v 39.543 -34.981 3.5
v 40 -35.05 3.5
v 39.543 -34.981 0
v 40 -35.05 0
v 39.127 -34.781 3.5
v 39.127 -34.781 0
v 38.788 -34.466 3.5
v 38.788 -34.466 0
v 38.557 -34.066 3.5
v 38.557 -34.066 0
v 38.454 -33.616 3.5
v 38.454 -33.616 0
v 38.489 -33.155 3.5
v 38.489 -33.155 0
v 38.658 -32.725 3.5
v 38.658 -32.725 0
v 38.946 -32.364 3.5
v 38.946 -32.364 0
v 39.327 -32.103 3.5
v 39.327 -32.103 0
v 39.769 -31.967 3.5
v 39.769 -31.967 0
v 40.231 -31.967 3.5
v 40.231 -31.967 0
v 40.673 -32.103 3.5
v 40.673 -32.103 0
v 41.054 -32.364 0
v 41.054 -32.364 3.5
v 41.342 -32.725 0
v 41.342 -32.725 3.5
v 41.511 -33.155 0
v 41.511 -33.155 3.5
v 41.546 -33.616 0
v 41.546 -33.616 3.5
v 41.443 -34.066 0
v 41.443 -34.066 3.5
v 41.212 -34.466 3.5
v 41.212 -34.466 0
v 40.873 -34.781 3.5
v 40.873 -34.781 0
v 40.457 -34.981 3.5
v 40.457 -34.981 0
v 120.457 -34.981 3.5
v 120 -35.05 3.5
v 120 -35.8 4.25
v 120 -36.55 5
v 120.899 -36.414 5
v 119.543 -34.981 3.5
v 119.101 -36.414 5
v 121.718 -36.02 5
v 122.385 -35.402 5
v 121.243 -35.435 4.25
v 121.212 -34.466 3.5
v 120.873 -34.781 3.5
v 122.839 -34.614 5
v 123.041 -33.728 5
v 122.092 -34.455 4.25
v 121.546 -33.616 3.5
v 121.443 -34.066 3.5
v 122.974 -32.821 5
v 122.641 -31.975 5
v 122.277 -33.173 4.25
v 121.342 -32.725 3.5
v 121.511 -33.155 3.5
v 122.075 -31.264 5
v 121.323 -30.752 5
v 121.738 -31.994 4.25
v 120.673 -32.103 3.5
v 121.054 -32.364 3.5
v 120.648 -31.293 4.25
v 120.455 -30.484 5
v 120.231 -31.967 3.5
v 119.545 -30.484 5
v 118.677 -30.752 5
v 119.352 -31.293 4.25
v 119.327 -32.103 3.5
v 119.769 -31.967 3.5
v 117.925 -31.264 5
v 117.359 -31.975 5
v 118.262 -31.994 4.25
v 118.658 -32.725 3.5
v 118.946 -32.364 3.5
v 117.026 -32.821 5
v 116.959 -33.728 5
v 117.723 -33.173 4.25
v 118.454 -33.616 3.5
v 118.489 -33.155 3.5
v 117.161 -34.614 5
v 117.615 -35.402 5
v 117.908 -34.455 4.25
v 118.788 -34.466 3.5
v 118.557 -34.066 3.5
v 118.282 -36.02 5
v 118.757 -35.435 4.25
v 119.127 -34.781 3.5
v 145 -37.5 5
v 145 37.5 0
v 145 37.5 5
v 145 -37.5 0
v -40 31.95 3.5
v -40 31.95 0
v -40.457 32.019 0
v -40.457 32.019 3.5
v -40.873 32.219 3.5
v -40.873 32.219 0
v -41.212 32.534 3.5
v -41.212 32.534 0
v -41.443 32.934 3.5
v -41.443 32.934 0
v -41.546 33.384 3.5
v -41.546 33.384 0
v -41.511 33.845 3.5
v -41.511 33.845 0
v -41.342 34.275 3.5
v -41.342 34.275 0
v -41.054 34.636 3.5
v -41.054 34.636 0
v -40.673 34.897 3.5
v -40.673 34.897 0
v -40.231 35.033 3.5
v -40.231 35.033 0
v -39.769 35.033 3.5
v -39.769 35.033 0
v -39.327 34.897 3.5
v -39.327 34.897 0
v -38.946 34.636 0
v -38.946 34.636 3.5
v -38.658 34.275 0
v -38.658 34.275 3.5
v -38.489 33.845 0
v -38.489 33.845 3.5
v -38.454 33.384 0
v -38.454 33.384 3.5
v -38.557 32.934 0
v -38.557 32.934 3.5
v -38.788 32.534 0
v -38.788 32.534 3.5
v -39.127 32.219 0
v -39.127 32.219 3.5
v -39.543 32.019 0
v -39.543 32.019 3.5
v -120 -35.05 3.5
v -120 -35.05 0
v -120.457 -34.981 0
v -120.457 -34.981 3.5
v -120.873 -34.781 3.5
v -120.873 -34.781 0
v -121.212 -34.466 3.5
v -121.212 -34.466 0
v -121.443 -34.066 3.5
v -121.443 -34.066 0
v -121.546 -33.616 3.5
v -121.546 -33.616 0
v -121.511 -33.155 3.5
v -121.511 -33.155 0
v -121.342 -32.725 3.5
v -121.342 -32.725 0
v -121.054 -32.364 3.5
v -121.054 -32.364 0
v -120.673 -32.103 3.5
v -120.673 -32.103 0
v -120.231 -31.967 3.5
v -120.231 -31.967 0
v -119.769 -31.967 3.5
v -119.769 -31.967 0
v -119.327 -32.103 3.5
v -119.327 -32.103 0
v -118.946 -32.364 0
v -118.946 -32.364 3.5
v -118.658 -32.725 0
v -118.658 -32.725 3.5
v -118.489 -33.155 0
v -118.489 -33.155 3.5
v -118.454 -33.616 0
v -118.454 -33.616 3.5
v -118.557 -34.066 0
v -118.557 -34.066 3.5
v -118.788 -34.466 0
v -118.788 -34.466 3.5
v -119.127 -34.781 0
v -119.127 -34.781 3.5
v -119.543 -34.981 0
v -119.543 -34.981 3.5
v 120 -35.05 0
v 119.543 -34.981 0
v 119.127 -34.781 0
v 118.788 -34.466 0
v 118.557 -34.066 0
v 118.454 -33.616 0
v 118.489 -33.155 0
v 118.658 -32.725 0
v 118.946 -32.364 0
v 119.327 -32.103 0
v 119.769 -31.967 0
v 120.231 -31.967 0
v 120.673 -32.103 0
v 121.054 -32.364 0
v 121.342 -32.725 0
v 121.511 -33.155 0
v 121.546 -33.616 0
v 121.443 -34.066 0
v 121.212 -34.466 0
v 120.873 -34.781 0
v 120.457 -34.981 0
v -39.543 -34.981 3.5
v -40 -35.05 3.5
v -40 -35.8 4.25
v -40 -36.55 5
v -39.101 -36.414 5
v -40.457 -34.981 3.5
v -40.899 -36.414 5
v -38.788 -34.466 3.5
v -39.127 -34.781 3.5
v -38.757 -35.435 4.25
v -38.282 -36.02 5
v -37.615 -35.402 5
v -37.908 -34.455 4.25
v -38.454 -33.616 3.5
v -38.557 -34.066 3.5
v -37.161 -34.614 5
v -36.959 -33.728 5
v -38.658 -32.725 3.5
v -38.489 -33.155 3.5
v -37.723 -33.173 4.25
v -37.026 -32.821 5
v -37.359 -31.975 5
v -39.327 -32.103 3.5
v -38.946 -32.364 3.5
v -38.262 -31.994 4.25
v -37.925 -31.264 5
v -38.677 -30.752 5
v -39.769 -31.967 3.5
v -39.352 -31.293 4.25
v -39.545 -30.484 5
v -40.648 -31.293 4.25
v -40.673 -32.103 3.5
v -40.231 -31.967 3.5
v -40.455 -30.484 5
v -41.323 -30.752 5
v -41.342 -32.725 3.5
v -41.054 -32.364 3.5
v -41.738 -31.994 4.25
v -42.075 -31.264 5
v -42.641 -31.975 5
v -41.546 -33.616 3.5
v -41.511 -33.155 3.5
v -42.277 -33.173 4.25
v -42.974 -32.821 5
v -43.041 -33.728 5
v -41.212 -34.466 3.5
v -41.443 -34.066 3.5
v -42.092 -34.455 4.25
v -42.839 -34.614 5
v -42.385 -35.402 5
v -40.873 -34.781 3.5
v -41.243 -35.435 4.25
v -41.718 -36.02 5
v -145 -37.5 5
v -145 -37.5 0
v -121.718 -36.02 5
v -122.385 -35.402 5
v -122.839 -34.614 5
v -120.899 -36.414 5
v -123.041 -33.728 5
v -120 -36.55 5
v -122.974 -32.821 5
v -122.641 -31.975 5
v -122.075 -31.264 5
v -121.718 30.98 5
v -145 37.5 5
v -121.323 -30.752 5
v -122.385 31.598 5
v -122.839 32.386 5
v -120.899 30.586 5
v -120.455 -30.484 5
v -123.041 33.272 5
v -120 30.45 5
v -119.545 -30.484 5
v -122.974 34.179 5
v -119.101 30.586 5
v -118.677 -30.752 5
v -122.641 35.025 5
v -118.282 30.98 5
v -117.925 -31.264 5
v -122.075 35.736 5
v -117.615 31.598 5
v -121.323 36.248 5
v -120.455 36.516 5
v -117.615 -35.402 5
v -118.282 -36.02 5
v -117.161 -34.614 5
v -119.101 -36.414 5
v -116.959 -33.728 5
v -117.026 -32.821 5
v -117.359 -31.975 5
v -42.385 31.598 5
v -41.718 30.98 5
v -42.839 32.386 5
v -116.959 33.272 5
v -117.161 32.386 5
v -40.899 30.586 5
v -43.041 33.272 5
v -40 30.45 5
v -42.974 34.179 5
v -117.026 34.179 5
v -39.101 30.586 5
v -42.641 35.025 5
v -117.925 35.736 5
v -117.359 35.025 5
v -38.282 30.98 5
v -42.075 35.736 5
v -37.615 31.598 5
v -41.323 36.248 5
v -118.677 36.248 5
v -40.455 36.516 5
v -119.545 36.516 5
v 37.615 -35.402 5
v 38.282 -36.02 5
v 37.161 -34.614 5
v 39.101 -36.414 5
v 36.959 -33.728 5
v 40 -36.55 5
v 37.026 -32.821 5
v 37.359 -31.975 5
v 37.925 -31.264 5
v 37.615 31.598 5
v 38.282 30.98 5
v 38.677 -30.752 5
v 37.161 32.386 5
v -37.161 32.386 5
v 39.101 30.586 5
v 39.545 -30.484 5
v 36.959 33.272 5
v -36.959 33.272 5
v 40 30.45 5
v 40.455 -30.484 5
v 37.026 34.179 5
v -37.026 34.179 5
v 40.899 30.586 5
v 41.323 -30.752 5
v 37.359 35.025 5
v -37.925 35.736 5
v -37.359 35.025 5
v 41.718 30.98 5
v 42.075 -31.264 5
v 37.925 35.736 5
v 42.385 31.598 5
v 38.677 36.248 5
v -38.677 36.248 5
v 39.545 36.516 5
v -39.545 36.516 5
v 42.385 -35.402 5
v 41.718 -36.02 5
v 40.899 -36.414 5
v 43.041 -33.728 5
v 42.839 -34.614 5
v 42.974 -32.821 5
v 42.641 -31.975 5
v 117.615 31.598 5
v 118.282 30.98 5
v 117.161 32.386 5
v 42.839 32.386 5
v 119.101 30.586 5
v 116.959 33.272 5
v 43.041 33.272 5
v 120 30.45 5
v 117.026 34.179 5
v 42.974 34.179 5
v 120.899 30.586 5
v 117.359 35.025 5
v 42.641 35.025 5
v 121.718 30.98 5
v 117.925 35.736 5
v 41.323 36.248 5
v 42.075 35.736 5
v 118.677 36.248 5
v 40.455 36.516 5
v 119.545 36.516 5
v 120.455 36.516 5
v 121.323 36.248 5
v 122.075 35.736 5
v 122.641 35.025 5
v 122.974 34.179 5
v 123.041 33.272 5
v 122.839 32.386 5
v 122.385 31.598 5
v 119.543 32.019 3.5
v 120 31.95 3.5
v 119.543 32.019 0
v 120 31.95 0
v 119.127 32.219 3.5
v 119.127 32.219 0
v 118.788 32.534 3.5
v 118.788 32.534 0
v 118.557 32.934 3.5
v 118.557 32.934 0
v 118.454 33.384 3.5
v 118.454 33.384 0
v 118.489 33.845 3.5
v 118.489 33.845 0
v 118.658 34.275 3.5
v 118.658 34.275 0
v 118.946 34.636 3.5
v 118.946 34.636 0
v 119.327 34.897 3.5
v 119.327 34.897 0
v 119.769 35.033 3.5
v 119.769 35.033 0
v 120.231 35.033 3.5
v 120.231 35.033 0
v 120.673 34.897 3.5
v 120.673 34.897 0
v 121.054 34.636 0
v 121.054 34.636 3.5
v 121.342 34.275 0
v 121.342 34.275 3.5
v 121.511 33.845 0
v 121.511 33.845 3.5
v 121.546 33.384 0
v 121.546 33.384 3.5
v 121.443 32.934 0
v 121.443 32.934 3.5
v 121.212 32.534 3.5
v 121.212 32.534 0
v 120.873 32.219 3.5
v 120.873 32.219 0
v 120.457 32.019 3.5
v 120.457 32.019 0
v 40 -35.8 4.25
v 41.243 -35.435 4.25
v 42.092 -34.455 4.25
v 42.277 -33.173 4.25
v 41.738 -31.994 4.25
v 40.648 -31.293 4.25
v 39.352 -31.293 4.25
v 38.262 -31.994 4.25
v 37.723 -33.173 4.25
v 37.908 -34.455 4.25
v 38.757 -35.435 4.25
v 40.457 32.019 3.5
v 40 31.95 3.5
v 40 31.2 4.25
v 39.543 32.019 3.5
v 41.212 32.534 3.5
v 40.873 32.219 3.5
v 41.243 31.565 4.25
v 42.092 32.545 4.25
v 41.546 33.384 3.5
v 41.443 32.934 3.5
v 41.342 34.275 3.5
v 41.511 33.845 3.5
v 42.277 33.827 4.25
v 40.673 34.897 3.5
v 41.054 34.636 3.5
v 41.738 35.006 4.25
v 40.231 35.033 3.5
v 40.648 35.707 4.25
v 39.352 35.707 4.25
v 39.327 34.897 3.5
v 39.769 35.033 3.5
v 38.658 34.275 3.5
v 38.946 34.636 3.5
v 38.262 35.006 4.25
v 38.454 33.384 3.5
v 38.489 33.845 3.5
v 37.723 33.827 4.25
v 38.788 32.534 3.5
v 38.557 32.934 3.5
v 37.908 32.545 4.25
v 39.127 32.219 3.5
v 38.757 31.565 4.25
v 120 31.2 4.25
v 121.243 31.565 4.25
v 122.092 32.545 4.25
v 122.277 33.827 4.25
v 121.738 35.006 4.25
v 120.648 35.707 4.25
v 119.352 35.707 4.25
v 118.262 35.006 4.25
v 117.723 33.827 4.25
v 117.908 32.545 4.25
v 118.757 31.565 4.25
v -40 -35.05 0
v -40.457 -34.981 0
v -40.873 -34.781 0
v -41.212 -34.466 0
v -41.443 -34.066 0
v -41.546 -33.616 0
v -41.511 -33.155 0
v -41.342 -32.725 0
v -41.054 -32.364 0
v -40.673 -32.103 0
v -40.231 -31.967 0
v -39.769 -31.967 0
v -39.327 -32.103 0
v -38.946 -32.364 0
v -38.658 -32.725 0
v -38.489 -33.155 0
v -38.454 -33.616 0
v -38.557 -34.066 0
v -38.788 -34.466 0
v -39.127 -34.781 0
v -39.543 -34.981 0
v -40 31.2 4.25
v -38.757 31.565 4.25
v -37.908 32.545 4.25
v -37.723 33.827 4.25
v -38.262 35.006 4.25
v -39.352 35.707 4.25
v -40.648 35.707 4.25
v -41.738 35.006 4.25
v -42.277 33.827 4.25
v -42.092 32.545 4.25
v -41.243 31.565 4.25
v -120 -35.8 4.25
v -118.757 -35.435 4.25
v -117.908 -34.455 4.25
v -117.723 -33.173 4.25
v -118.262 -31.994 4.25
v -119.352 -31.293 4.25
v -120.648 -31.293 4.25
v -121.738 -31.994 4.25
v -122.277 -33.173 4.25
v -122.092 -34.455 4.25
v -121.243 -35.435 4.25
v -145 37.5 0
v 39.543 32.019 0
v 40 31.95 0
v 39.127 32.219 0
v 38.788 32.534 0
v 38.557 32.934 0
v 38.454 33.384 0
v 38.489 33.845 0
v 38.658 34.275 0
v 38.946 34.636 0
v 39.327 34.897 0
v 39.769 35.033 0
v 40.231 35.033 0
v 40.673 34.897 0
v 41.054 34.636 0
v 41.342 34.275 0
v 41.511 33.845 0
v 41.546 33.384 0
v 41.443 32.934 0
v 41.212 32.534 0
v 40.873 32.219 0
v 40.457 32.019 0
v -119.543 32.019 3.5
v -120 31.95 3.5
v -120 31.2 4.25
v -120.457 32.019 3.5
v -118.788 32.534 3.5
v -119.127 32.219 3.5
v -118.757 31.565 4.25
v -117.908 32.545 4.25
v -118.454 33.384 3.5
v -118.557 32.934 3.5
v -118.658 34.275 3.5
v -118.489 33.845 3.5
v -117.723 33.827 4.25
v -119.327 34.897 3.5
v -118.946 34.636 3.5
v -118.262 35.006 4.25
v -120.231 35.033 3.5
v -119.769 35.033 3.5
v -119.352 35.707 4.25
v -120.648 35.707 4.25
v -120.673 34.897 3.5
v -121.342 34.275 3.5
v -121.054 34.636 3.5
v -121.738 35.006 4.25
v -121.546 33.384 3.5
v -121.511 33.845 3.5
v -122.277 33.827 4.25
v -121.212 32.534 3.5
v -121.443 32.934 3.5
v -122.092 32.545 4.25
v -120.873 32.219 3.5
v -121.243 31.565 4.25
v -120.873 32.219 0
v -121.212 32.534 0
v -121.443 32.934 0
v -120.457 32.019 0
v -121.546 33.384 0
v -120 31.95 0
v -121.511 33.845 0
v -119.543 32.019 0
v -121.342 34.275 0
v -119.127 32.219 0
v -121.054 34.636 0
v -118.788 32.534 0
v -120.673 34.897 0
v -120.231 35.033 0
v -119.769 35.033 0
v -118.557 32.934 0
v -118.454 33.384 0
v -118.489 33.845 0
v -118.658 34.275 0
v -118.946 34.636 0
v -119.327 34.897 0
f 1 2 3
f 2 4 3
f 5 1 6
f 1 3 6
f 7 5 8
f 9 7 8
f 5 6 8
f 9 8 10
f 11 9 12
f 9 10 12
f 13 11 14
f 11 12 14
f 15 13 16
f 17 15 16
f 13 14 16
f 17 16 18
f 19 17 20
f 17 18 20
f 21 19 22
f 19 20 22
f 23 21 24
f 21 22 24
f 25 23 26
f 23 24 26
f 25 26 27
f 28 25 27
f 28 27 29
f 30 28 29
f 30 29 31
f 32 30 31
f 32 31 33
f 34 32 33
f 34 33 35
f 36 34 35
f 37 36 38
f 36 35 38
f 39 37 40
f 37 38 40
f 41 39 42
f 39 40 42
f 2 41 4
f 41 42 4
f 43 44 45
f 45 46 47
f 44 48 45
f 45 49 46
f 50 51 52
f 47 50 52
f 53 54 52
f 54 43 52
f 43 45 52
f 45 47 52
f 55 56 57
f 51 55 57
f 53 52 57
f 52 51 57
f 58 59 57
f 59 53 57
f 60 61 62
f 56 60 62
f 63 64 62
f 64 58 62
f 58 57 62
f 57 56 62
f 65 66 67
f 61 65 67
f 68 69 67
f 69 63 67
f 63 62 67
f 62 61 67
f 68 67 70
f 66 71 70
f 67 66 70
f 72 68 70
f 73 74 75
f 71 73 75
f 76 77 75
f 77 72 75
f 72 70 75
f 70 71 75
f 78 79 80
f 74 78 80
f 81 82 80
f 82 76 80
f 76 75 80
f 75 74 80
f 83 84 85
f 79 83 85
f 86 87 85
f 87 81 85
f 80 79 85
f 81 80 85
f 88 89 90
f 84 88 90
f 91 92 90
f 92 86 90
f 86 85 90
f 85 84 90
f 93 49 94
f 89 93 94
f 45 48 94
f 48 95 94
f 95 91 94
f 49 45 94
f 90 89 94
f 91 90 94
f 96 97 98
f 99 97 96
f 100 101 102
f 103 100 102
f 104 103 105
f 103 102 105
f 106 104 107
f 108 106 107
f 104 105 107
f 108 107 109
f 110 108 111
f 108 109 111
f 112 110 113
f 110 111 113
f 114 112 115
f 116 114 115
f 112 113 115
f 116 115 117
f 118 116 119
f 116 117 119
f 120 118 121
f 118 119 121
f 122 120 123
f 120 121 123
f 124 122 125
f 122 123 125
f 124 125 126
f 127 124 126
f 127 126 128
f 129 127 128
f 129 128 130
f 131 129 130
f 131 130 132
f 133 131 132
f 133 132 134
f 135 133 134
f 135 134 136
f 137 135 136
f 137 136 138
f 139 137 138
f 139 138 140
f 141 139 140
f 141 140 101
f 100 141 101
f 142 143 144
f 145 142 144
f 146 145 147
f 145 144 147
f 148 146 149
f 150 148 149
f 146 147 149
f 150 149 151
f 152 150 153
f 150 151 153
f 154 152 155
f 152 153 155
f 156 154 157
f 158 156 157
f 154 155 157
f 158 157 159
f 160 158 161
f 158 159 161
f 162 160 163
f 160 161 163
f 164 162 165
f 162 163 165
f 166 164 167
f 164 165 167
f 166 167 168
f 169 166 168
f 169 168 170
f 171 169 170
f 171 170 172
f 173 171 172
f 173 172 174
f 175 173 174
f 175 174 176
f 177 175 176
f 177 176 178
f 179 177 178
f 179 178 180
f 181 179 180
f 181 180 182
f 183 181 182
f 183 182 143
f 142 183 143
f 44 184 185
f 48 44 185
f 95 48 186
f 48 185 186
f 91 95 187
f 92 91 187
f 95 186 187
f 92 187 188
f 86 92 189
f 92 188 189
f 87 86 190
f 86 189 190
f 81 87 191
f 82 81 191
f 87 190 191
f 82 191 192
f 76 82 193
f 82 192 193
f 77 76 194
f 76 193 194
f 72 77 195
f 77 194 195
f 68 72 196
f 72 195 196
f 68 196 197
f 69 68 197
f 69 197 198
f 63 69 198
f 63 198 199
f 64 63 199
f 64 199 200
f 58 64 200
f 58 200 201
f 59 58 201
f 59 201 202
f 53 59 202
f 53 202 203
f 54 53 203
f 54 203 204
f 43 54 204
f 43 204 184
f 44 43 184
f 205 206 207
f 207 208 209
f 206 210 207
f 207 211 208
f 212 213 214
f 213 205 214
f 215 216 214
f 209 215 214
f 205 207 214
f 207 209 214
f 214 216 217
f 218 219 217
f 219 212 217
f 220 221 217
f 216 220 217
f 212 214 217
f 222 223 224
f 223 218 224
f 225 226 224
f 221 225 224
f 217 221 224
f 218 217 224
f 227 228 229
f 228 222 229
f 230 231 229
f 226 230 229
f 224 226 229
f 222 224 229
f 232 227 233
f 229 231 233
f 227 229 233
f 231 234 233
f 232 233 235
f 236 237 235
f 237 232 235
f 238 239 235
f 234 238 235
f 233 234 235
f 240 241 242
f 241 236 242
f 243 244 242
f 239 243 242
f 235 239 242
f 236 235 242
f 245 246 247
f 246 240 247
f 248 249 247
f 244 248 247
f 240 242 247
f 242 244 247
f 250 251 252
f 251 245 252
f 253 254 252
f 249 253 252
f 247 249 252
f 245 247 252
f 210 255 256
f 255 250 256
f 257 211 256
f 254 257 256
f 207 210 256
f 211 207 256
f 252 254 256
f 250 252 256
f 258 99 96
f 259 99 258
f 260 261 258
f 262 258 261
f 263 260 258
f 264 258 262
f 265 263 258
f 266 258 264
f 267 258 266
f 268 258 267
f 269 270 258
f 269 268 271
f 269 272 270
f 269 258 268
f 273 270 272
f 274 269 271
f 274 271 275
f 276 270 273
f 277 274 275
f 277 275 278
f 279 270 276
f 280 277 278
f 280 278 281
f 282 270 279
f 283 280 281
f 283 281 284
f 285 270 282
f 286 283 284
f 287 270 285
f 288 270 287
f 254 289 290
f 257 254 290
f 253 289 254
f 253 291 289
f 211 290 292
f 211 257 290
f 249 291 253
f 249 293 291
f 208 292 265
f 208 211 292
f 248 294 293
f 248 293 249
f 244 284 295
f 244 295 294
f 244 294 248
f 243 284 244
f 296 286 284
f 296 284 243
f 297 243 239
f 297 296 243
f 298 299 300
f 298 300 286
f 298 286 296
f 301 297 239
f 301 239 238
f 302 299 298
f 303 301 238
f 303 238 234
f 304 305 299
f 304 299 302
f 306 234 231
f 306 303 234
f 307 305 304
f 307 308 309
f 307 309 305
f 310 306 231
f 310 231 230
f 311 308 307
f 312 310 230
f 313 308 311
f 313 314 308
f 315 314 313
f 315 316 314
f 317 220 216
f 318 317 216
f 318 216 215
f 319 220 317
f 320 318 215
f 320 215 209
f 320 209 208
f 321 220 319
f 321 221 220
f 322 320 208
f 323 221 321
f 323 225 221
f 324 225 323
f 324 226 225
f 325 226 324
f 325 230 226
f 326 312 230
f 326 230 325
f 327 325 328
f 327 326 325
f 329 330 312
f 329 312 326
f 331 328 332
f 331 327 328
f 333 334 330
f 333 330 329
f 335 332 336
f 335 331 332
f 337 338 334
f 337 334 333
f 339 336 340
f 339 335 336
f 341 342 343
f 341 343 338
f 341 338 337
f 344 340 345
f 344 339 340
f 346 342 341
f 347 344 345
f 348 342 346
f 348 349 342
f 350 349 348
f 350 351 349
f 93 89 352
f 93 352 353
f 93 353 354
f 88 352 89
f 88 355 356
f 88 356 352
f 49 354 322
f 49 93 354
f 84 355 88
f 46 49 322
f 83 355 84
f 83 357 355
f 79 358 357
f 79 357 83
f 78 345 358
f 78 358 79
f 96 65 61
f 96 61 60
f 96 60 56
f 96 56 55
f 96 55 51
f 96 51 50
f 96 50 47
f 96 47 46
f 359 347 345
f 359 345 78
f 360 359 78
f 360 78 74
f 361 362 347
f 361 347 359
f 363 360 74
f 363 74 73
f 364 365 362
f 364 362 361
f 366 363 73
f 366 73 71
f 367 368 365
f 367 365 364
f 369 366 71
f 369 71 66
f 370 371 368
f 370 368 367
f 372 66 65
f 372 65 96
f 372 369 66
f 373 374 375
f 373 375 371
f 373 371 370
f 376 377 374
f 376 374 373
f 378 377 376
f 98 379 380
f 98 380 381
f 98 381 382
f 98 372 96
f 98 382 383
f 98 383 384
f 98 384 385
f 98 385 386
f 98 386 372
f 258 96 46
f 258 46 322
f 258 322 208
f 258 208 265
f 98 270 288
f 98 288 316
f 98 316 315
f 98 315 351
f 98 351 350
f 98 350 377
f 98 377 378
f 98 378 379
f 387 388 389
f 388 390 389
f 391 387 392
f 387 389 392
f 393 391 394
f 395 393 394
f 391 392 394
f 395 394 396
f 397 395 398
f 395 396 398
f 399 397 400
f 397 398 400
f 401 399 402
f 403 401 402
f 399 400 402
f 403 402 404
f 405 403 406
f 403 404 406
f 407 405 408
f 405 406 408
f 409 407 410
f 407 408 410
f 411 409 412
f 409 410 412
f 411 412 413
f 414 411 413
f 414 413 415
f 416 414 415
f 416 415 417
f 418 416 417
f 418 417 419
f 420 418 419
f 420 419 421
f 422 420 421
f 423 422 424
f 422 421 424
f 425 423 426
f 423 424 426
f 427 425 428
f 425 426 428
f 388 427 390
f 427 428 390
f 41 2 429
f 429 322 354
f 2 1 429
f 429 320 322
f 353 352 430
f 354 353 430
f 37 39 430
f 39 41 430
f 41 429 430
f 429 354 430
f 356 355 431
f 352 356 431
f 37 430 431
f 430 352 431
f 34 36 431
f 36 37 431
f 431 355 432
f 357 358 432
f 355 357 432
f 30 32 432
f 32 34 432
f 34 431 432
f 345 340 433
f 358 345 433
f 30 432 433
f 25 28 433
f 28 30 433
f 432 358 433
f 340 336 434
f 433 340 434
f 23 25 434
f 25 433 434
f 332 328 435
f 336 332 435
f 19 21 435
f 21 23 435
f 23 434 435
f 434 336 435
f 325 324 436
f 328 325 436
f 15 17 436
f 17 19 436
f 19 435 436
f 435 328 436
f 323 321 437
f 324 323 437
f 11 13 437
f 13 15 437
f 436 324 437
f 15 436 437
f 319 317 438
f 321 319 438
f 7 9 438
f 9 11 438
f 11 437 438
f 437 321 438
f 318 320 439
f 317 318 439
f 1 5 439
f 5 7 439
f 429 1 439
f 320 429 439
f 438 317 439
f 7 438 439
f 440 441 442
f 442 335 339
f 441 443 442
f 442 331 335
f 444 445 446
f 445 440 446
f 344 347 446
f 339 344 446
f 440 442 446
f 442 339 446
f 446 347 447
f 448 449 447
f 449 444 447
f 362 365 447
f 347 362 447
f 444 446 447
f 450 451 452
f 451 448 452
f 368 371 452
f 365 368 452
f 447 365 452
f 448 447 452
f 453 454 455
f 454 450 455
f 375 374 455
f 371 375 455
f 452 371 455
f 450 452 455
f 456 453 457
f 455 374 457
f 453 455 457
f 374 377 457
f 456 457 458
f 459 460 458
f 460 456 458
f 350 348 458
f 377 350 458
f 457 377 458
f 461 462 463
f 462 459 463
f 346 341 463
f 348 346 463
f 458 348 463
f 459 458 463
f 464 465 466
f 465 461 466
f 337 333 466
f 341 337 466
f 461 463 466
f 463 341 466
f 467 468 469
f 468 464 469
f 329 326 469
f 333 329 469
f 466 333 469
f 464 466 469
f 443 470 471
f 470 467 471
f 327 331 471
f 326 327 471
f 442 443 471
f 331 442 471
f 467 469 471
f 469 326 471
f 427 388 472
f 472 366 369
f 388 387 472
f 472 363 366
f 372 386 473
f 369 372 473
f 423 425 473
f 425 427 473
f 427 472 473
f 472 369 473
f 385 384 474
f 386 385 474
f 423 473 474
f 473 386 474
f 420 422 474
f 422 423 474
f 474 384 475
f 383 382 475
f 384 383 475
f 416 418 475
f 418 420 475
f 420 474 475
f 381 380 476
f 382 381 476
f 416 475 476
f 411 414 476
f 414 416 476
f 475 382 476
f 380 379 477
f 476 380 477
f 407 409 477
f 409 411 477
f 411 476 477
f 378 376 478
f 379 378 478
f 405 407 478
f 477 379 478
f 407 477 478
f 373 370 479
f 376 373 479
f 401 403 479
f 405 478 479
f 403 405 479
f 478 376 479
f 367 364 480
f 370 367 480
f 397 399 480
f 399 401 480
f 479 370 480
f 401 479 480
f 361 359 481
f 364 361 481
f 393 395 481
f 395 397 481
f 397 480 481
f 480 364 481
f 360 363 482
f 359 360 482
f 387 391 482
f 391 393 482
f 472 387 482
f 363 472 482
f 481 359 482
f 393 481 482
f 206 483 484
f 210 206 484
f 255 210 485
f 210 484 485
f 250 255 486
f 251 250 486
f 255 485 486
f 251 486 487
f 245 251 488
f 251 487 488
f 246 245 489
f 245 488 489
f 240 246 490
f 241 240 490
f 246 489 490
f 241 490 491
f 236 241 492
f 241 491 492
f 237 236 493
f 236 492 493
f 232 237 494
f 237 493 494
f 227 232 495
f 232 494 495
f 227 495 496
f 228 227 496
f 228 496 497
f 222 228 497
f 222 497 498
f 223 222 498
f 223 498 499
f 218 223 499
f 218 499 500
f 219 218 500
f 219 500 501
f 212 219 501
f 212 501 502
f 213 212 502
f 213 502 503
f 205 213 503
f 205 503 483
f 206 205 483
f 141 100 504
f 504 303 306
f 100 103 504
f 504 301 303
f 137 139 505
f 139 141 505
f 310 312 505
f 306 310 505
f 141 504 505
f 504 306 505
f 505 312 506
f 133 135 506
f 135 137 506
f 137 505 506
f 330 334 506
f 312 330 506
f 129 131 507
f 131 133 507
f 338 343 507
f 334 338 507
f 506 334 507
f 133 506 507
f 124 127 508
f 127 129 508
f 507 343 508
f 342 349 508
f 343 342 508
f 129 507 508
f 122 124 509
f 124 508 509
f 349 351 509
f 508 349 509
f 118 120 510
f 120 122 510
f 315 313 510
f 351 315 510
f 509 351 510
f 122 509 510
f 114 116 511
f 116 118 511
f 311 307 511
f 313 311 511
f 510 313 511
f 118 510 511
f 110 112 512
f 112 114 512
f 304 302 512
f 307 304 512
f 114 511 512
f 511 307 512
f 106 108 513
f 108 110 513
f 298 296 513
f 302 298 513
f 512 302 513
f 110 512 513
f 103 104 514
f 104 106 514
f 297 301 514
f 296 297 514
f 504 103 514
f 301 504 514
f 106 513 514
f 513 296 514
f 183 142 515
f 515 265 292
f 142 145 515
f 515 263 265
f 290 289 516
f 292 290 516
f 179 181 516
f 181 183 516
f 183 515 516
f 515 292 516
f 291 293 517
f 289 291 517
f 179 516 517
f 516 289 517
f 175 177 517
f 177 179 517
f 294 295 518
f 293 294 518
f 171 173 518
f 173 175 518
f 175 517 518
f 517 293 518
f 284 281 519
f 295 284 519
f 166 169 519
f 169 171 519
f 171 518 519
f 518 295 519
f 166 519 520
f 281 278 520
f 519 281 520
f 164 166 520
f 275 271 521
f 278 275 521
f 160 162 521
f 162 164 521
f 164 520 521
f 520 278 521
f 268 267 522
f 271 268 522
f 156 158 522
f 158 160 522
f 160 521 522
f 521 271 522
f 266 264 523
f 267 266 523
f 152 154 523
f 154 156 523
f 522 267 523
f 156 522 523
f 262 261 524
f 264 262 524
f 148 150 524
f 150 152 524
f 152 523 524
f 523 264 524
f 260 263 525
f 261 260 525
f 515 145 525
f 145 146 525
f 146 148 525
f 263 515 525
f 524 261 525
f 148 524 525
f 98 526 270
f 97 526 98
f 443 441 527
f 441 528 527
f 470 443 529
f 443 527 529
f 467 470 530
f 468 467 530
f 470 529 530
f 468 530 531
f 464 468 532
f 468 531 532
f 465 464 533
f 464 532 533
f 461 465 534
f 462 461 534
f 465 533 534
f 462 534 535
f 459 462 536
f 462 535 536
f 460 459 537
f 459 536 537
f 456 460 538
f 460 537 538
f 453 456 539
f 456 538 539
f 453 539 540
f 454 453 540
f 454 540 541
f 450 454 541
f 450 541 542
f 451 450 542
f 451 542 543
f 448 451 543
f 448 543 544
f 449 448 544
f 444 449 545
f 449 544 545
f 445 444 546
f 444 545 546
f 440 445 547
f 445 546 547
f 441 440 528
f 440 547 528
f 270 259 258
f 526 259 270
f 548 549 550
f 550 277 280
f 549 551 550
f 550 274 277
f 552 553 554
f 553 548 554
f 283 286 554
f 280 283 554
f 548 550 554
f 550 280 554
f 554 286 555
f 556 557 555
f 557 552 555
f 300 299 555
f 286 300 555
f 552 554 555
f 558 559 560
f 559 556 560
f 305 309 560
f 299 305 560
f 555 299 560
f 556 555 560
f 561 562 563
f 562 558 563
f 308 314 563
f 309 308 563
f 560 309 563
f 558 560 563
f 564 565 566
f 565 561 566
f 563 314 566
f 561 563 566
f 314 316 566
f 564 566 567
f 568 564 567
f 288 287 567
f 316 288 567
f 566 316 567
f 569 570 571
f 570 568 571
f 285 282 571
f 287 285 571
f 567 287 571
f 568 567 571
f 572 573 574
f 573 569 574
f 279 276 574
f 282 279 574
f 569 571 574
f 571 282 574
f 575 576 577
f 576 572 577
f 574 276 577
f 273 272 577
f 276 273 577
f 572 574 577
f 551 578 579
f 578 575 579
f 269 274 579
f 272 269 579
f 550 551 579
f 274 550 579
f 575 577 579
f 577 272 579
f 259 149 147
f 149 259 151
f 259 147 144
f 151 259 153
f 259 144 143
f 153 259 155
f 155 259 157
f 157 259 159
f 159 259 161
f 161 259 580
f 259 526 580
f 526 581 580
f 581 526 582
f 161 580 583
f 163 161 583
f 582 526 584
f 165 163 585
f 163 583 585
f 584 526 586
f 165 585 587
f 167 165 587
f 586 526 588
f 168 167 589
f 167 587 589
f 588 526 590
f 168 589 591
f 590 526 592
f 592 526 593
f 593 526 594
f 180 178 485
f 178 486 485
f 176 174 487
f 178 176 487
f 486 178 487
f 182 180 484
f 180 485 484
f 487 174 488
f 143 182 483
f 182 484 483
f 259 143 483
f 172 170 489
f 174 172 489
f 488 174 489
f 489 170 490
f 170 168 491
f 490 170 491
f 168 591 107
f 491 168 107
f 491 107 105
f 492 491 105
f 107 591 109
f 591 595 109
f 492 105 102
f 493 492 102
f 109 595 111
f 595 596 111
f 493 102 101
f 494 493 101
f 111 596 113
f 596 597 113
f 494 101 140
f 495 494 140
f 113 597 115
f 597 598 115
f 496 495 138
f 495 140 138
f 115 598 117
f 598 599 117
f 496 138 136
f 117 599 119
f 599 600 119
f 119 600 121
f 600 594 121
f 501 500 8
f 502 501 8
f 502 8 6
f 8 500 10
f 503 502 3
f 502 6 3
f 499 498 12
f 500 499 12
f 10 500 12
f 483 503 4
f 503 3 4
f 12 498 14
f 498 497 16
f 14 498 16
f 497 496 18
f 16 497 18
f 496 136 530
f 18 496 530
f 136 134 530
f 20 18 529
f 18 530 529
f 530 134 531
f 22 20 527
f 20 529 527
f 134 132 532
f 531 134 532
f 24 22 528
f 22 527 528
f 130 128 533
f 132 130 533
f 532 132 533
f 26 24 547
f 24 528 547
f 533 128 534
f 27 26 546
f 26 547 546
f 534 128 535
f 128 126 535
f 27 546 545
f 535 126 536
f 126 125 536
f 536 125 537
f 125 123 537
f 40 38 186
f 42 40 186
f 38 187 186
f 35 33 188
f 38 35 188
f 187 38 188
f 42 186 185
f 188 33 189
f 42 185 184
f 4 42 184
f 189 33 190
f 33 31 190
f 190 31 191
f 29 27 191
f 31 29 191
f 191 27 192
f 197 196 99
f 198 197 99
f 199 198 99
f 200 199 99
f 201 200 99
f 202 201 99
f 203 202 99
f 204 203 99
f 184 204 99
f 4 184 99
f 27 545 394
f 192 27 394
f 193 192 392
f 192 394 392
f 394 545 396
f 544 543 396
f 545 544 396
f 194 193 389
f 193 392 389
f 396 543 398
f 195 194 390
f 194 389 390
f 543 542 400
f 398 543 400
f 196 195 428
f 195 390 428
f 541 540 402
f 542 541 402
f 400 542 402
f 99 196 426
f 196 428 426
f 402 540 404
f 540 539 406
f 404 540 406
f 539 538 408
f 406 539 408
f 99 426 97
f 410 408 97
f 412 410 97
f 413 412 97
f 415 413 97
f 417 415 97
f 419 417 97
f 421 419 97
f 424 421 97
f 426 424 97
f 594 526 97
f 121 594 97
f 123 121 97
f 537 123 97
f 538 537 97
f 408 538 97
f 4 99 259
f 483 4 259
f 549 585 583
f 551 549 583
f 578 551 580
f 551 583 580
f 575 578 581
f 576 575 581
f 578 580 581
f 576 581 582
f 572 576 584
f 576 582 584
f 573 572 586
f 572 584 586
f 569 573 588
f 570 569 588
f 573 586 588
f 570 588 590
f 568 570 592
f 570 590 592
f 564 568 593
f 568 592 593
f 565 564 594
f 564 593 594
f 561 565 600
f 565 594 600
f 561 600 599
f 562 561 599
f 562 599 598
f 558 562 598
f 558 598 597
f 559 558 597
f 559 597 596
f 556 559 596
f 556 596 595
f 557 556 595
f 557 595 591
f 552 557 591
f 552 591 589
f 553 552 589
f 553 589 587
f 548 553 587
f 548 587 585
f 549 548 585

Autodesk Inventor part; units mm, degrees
ref_plane "YZ Plane" through (0, 0, 0) normal (1, 0, 0) x (0, 1, 0)
ref_plane "XZ Plane" through (0, 0, 0) normal (0, 1, 0) x (-1, 0, 0)
ref_plane "XY Plane" through (0, 0, 0) normal (0, 0, 1) x (1, 0, 0)
sketch "Skizze1" plane through (0, 0, 0) normal (0, 0, 1) x (1, 0, 0)
  line L0 (145, -37.5) -> (-145, -37.5)
  line L1 (-145, -37.5) -> (-145, 37.5)
  line L2 (-145, 37.5) -> (145, 37.5)
  line L3 (145, 37.5) -> (145, -37.5)
  line L4 (0, 52.5) -> (0, -52.5) projected
  line L5 (-203, 0) -> (203, 0) projected
  point P0 (0, 0)
  point P1 (0, -37.5)
  point P2 (-145, 0)
  dimension "d0" = 290
  dimension "d1" = 75
extrude "Extrusion1" add sketch "Skizze1" along normal blind 5
sketch "Skizze2" plane through (0, 0, 5) normal (0, 0, 1) x (1, 0, 0)
  line L0 (-145, -37.5) -> (-145, 37.5) projected
  line L1 (145, -37.5) -> (-145, -37.5) projected
  point P0 (0, 0)
  point P1 (-120, -33.5)
  dimension "d4" = 25
  dimension "d5" = 4
hole "Bohrung1" at (-120, -33.5, 5) direction (0, 0, -1) diameter 3.1 end through all countersink diameter 6.1 countersink angle 90
pattern_linear "Rechteckige Anordnung1" count 4 spacing 80 along (1, 0, 0) count 2 spacing 67 along (0, 1, 0) of "Bohrung1"
properties part number "Tunneldecke" material "Polycarbonate, Clear"
